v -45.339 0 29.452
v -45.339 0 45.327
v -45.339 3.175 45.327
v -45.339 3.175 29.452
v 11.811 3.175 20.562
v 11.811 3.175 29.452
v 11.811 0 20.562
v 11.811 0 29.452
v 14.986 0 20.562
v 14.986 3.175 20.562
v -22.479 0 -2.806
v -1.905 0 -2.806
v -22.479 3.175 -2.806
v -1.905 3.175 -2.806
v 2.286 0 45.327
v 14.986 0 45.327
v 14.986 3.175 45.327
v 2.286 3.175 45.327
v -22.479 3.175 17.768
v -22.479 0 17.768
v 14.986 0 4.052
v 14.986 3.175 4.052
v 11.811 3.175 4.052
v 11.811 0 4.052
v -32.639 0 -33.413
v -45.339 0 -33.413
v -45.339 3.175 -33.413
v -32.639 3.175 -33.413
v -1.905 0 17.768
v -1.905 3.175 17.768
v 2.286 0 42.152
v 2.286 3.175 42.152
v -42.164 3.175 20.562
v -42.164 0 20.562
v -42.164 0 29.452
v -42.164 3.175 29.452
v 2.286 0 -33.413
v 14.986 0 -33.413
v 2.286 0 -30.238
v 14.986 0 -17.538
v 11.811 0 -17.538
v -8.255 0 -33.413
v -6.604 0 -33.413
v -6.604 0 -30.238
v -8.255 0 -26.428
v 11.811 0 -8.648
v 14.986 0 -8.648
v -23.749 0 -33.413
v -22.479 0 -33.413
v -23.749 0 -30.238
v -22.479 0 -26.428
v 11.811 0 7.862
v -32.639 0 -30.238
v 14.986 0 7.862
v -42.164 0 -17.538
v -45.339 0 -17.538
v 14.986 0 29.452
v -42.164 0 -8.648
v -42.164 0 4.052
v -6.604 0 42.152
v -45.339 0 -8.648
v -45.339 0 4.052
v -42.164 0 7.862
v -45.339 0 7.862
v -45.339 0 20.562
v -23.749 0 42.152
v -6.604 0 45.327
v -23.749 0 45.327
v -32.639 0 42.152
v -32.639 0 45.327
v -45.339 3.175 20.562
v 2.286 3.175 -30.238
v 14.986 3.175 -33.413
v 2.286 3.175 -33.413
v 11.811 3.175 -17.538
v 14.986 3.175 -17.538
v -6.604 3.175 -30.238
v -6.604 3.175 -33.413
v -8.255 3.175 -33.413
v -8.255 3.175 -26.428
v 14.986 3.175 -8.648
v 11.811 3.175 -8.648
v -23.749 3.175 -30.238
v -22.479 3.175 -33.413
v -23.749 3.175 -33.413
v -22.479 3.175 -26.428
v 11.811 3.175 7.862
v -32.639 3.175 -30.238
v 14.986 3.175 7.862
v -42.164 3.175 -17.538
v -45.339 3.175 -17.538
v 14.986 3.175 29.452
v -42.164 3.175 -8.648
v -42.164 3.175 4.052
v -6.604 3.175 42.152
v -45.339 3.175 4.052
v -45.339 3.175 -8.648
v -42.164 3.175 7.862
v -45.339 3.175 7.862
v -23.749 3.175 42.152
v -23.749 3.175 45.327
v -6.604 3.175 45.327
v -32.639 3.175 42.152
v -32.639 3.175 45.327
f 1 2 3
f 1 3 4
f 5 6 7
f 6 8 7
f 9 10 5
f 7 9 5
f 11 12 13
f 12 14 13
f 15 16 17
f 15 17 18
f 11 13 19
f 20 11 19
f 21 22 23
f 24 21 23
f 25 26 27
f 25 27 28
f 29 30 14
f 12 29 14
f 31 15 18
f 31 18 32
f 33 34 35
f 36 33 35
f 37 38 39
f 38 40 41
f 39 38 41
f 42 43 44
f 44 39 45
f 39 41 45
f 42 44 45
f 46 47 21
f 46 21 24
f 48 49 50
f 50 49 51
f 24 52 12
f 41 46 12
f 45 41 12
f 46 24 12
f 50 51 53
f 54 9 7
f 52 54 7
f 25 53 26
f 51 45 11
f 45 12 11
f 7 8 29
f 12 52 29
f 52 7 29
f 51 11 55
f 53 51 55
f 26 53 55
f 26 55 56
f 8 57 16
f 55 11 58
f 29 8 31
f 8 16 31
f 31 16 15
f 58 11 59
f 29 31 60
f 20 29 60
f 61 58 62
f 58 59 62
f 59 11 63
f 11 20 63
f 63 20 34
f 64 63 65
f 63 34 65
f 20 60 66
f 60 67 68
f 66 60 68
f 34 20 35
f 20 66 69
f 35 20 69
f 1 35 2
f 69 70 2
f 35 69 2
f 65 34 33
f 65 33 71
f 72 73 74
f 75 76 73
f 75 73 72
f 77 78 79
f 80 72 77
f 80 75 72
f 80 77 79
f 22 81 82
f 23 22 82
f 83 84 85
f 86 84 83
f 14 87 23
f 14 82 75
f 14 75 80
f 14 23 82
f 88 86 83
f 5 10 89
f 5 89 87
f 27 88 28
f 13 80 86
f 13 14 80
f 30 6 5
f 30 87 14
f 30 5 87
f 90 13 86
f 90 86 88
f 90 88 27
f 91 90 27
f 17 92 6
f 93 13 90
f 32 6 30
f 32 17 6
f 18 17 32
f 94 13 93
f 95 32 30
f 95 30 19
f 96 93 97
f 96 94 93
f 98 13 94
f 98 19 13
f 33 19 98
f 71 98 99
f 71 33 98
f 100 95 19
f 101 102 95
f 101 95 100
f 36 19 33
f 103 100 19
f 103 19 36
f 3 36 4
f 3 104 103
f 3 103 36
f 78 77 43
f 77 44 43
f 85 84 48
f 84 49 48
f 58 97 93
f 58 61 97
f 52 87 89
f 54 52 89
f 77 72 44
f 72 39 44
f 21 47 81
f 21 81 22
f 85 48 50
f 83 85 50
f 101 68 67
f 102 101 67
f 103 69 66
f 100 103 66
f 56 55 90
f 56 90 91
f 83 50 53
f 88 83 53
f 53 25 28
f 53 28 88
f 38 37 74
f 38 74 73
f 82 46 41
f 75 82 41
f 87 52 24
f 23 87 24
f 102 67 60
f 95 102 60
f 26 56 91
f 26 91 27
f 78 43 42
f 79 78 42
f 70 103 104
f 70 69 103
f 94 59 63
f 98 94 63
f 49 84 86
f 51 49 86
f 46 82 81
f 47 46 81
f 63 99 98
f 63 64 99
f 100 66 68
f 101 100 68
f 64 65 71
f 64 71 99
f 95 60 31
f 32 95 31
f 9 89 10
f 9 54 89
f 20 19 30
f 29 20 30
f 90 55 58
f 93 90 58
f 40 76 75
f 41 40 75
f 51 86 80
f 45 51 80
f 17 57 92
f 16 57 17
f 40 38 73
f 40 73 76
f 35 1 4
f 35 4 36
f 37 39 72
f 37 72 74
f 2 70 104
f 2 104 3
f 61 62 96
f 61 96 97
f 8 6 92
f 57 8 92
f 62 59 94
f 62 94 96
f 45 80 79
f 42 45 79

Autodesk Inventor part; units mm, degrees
ref_plane "YZ Plane" through (0, 0, 0) normal (1, 0, 0) x (0, 1, 0)
ref_plane "XZ Plane" through (0, 0, 0) normal (0, 1, 0) x (-1, 0, 0)
ref_plane "XY Plane" through (0, 0, 0) normal (0, 0, 1) x (1, 0, 0)
sketch "Sketch1" plane through (0, 0, 0) normal (0, 1, 0) x (-1, 0, 0)
  line L0 (-11.8108, -30.2381) -> (15.1767, -30.2381)
  line L1 (15.1767, -30.2381) -> (15.1767, 5.9569)
  line L2 (15.1767, 5.9569) -> (-11.8108, 5.9569)
  line L3 (-11.8108, 5.9569) -> (-11.8108, -30.2381)
  line L4 (-11.8108, -30.2381) -> (-14.9858, -30.2381)
  line L5 (-14.9858, -30.2381) -> (-14.9858, -17.5381)
  line L6 (-14.9858, -17.5381) -> (-11.8108, -17.5381)
  line L7 (-11.8108, -17.5381) -> (-11.8108, -30.2381)
  line L8 (-11.8108, -8.6481) -> (-14.9858, -8.6481)
  line L9 (-14.9858, -8.6481) -> (-14.9858, 4.0519)
  line L10 (-14.9858, 4.0519) -> (-11.8108, 4.0519)
  line L11 (-11.8108, 4.0519) -> (-11.8108, -8.6481)
  line L12 (-14.9858, -30.2381) -> (-2.2858, -30.2381)
  line L13 (-2.2858, -30.2381) -> (-2.2858, -33.4131)
  line L14 (-2.2858, -33.4131) -> (-14.9858, -33.4131)
  line L15 (-14.9858, -33.4131) -> (-14.9858, -30.2381)
  line L16 (15.1767, -30.2381) -> (6.6042, -30.2381)
  line L17 (6.6042, -30.2381) -> (6.6042, -33.4131)
  line L18 (6.6042, -33.4131) -> (15.1767, -33.4131)
  line L19 (15.1767, -33.4131) -> (15.1767, -30.2381)
  point P0 (0, 0)
  dimension "d0" = 26.9875
  dimension "d1" = 36.195
  dimension "d5" = 3.175
  dimension "d6" = 12.7
  dimension "d7" = 8.89
  dimension "d8" = 12.7
  dimension "d10" = 12.7
  dimension "d11" = 8.89
extrude "Extrusion1" add sketch "Sketch1" along normal blind 3.175
mirror "Mirror1" about plane through (-15.1767, 0, 5.9569) normal (0, 0, 1) of "Extrusion1"
mirror "Mirror2" about plane through (-15.1767, 0, -33.4131) normal (-1, 0, 0) of "Extrusion1", "Mirror1"
sketch "Sketch2" plane through (0, 3.175, 0) normal (0, 1, 0) x (1, 0, 0)
  line L0 (-1.9052, 2.8061) -> (-22.4792, 2.8061)
  line L1 (-22.4792, 2.8061) -> (-22.4792, -17.7679)
  line L2 (-22.4792, -17.7679) -> (-1.9052, -17.7679)
  line L3 (-1.9052, -17.7679) -> (-1.9052, 2.8061)
  line L4 (14.9858, -7.8619) -> (14.9858, -20.5619) projected
  line L5 (-45.3392, -7.8619) -> (-45.3392, -20.5619) projected
  line L6 (-23.7492, -45.3269) -> (-6.6042, -45.3269) projected
  line L7 (-6.6042, 33.4131) -> (-23.7492, 33.4131) projected
  line L8 (-22.4792, 26.4281) -> (-8.2552, 26.4281)
  line L9 (-8.2552, 26.4281) -> (-8.2552, 33.4131)
  line L10 (-8.2552, 33.4131) -> (-22.4792, 33.4131)
  line L11 (-22.4792, 33.4131) -> (-22.4792, 26.4281)
  point P0 (0, 0)
  dimension "d14" = 20.574
  dimension "d15" = 16.891
  dimension "d16" = 22.86
  dimension "d17" = 27.559
  dimension "d18" = 20.574
  dimension "d19" = 14.224
  dimension "d20" = 6.985
extrude "Extrusion2" cut sketch "Sketch2" against normal blind 3.175
